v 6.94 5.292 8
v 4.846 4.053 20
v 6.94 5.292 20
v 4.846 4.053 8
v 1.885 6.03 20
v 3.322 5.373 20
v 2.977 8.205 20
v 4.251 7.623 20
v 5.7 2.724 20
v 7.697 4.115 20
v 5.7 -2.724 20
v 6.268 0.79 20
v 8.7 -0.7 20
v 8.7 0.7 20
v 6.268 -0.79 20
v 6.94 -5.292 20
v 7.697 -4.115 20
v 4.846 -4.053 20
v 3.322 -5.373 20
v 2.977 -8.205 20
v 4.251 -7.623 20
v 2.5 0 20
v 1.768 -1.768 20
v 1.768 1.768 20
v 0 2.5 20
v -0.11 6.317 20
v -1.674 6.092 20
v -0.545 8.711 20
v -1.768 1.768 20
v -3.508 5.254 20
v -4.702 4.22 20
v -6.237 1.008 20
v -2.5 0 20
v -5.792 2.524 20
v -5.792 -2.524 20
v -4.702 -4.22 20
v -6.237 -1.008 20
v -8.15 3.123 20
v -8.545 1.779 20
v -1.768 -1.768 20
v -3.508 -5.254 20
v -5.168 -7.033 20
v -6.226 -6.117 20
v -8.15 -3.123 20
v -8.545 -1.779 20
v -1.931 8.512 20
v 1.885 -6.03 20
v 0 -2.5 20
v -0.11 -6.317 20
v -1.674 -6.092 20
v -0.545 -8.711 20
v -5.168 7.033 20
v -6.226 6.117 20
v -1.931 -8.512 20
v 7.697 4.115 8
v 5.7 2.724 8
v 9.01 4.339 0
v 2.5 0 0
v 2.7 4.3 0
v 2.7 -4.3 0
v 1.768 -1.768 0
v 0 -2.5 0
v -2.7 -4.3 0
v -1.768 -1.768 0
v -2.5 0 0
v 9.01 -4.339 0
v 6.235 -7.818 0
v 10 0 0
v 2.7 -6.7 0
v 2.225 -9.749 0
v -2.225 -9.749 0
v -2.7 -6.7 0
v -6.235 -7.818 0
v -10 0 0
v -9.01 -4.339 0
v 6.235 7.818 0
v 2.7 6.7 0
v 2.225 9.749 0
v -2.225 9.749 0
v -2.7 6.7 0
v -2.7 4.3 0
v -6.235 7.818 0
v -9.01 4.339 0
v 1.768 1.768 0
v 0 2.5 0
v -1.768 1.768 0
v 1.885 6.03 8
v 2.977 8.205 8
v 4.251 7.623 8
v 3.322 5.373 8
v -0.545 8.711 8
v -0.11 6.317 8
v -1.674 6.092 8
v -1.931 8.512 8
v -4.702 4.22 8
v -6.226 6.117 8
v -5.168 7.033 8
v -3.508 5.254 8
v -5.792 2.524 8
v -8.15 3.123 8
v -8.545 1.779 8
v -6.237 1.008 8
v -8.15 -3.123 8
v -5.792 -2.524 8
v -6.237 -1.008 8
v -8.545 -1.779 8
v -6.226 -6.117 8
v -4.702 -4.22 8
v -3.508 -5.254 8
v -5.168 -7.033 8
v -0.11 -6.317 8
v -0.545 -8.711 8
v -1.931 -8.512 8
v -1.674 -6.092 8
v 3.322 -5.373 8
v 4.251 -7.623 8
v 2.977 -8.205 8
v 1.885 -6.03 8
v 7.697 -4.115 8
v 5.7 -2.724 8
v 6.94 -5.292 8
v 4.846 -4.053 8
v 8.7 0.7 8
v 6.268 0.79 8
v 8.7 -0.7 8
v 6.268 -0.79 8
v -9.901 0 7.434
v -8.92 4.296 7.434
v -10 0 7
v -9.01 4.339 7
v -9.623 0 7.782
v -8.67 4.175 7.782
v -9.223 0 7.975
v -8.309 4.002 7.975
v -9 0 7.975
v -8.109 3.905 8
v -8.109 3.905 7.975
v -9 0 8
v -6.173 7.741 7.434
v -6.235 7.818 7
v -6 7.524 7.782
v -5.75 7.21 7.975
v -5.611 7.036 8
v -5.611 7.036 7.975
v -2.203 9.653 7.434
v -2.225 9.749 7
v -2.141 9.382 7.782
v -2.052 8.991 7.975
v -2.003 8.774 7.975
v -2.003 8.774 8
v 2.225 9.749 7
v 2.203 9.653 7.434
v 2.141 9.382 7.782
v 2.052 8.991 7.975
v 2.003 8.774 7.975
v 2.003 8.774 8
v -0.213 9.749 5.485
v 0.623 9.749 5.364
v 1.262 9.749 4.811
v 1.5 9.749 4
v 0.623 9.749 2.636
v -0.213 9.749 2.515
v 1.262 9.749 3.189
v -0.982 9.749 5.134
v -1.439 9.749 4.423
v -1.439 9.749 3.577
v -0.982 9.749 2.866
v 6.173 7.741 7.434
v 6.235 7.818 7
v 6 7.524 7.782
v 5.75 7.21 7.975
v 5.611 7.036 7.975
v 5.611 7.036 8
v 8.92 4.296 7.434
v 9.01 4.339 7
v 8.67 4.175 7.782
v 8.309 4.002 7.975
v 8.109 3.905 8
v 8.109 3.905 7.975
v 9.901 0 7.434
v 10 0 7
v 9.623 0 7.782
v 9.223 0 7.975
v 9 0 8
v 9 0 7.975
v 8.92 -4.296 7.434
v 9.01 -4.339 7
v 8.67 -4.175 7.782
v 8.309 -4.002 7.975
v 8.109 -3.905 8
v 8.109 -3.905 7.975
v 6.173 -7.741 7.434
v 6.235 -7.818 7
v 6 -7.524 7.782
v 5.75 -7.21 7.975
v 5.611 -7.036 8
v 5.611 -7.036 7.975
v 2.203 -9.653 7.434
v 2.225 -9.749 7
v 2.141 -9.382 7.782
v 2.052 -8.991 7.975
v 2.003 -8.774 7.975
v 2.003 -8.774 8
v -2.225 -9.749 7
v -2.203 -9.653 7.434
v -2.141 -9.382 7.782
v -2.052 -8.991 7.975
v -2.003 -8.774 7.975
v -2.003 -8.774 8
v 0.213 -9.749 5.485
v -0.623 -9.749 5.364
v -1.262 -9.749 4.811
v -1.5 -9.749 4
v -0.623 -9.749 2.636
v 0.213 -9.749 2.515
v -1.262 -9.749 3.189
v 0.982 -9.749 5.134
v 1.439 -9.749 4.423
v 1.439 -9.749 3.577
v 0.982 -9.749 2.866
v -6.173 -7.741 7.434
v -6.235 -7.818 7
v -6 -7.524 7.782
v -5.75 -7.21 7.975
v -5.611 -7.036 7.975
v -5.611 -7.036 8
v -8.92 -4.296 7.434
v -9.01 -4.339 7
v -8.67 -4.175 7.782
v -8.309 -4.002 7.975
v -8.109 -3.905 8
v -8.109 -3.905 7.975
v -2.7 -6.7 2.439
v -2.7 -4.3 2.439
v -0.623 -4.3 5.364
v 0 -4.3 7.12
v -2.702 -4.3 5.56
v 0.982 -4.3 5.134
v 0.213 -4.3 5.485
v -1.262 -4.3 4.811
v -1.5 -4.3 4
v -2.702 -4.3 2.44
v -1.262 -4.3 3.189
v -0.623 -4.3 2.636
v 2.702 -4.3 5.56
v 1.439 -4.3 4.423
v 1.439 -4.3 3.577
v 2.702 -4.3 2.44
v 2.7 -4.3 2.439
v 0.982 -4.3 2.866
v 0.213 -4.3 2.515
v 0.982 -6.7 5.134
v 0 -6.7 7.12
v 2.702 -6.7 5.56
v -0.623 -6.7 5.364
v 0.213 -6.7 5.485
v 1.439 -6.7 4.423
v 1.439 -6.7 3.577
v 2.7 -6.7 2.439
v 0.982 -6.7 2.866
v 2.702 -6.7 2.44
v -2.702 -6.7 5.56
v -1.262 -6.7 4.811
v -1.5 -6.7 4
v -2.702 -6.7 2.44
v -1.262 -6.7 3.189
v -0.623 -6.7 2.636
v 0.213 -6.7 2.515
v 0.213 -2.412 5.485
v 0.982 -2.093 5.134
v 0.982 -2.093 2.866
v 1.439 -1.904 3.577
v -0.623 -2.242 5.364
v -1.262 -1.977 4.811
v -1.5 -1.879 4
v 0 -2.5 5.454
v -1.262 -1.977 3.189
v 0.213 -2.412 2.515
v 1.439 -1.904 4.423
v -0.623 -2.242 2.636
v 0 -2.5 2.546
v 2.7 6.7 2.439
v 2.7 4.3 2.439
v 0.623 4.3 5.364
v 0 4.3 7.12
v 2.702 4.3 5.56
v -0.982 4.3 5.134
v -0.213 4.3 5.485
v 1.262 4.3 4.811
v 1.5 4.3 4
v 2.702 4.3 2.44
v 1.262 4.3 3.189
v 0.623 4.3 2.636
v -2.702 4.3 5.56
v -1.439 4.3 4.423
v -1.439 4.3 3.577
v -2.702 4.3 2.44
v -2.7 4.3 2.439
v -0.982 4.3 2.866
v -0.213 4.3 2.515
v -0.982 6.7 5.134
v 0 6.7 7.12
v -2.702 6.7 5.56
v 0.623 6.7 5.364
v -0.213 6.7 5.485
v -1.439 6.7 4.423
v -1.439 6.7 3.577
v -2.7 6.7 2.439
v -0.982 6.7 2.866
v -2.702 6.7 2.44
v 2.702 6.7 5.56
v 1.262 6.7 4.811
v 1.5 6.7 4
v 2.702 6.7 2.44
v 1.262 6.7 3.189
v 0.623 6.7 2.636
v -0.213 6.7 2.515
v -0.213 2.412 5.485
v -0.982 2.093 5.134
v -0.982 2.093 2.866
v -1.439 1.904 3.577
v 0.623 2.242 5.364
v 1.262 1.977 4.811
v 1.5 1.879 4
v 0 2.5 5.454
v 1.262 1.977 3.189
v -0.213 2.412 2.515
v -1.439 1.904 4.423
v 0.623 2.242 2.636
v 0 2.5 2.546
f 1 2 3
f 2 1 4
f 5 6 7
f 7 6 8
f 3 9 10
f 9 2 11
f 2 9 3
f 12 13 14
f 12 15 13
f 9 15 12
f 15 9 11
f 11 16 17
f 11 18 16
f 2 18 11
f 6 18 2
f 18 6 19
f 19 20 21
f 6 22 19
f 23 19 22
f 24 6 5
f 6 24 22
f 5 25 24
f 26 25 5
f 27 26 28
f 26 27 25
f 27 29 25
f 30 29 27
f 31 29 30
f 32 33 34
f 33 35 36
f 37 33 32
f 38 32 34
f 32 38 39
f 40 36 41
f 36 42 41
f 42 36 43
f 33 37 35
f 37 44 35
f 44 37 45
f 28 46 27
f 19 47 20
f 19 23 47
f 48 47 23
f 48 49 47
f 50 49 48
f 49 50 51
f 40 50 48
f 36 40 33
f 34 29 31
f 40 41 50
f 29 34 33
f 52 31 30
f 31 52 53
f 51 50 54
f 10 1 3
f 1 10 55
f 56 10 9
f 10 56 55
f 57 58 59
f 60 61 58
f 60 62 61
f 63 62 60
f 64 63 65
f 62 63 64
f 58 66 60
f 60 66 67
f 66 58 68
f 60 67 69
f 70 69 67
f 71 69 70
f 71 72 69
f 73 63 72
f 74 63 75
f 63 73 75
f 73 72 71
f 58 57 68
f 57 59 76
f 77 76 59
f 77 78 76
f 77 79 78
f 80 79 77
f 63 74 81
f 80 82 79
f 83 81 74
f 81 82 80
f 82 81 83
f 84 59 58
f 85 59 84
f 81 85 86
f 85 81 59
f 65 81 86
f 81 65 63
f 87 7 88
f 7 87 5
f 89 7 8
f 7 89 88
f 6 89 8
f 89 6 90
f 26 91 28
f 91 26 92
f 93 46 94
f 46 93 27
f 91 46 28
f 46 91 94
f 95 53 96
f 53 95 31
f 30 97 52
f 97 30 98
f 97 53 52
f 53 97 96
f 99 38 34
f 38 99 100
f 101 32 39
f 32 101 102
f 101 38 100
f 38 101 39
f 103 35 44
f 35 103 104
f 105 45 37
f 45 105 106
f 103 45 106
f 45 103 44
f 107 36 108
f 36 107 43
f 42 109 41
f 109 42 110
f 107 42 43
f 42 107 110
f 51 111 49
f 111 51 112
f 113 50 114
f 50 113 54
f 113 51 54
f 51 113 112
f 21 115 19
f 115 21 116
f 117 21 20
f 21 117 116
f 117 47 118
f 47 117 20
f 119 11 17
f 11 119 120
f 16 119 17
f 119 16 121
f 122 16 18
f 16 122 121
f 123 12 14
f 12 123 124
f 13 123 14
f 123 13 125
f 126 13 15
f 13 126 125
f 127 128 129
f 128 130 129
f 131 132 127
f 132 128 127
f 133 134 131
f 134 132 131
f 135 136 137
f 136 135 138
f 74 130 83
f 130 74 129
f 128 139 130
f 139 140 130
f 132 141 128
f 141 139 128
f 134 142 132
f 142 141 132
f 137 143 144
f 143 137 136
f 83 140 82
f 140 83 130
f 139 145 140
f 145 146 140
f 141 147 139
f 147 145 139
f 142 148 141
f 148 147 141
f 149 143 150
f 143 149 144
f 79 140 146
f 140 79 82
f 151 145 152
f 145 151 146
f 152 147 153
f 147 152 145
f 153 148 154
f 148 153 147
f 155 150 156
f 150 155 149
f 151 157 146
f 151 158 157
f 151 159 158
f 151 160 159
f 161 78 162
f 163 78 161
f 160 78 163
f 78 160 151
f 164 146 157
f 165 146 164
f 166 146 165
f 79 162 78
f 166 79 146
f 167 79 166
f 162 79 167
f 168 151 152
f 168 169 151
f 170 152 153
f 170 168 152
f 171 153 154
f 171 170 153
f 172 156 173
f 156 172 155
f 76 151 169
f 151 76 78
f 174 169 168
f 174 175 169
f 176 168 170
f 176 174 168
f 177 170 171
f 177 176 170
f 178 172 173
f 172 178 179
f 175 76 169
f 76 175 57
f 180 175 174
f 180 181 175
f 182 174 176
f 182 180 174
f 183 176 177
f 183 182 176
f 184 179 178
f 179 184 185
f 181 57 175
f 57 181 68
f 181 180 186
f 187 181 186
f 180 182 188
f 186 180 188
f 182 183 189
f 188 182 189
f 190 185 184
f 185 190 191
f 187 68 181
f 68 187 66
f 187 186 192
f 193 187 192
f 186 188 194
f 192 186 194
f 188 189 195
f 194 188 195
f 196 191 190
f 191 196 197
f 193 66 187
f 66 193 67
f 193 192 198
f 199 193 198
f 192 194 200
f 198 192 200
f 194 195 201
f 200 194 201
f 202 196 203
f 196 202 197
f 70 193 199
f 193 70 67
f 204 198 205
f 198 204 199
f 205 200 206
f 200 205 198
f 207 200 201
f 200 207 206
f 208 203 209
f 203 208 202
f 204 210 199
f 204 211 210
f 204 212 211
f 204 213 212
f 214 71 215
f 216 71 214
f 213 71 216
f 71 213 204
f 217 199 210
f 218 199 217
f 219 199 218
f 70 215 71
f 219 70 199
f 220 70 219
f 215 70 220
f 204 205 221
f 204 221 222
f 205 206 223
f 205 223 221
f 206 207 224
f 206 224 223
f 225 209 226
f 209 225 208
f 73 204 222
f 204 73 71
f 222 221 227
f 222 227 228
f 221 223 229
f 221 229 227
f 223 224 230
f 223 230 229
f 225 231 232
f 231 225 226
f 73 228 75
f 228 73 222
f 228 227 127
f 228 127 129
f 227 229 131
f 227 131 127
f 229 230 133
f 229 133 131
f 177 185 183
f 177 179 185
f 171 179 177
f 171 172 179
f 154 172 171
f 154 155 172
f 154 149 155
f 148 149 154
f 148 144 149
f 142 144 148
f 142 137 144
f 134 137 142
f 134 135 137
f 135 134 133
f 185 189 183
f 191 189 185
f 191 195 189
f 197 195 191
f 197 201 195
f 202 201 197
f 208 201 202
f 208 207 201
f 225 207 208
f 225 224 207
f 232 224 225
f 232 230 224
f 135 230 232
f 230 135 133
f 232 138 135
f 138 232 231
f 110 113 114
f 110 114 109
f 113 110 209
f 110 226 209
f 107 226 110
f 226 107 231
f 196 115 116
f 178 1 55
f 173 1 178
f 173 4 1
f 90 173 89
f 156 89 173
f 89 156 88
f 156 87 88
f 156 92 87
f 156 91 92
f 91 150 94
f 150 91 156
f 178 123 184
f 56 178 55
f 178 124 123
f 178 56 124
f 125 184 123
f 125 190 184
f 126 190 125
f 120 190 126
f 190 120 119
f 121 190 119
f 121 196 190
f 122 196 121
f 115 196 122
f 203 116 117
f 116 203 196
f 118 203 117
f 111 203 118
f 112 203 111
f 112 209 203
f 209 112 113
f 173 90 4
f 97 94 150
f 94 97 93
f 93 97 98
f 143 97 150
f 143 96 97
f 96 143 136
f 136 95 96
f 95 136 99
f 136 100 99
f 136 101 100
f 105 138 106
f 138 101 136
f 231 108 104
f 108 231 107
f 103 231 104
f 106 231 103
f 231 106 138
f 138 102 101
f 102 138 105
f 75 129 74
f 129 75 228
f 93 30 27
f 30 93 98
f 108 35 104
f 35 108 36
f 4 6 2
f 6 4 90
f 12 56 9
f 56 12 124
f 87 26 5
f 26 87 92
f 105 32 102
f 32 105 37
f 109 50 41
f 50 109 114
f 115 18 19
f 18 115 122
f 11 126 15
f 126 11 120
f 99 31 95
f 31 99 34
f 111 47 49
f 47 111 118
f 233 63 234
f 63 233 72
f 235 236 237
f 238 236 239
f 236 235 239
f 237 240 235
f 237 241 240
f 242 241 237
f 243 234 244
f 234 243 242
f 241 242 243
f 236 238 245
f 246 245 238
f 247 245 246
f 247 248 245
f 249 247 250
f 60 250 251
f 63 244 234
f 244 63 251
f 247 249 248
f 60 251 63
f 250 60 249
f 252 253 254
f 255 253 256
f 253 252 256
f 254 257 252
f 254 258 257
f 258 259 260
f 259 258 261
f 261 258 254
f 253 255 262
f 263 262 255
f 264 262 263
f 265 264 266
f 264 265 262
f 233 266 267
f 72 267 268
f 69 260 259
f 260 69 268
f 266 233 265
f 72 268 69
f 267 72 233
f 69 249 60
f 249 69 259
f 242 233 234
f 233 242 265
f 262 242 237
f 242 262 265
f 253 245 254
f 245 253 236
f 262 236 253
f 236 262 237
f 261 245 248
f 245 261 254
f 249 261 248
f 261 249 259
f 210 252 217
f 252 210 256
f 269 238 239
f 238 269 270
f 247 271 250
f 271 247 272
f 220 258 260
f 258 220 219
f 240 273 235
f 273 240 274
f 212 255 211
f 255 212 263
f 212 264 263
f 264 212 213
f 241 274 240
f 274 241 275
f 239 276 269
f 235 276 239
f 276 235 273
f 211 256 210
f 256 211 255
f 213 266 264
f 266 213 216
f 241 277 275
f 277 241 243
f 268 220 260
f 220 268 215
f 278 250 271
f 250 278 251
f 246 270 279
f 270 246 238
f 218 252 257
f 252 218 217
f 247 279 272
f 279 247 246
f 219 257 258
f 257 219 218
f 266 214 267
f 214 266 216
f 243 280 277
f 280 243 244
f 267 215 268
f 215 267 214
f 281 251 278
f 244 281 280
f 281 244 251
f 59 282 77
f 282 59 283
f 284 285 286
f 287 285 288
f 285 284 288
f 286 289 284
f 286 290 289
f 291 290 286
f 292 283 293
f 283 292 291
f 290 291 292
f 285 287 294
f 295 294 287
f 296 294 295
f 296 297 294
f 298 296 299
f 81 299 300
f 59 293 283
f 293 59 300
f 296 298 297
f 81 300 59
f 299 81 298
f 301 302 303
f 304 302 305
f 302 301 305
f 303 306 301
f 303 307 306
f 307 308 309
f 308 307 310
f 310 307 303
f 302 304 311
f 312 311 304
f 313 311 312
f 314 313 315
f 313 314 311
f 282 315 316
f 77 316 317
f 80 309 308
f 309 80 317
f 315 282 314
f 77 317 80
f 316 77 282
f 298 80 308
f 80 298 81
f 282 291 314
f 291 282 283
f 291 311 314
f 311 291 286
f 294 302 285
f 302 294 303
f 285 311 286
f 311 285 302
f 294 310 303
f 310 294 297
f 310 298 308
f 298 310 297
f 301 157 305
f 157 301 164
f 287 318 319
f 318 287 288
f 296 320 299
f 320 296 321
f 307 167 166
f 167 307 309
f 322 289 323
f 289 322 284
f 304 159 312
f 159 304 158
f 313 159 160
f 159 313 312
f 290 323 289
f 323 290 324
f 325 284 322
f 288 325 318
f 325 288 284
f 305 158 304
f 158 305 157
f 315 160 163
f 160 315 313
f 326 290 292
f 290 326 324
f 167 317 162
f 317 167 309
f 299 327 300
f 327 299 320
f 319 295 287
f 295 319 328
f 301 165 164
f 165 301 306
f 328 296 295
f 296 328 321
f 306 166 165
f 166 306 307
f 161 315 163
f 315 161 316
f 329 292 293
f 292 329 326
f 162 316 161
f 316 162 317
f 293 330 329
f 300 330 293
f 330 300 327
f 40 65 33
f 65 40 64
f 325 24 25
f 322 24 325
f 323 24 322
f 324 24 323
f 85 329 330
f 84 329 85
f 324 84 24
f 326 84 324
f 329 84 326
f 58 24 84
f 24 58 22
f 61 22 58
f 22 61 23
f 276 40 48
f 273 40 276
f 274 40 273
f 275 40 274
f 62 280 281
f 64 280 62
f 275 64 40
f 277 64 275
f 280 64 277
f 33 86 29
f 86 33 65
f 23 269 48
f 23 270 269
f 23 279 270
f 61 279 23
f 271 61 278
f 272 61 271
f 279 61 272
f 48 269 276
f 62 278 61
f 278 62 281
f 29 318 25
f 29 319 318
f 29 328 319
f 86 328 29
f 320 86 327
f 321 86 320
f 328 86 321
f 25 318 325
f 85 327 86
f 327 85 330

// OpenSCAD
$fn=11;
module main()
{
	module spur()
	{
		linear_extrude(height=20) polygon([[-2,-0.8],[-2,0.8],[0.7,0.7],[0.7,-0.7]],[[0,1,2,3,0]]);
	}
	
 difference()
 {	 
 	union()
 	{
 		//base
 		rotate_extrude($fn=14)
 		{
 				square([9,8]);
 				square([10,7]);
 				translate([9,7]) circle(1);
 		}
    	
    	//shaft
    	cylinder(r=6.5,h=20);
    	
    	//spurs
    	for(i=[1:11]) rotate([0,0,i*(360/11)])
    	translate([8,0,0])spur();
   }
   
   //shaft hole
    translate([0,0,-1])cylinder(r=2.5,h=22,$fn=8);
    		
    //captive nut and grub holes
    for(j=[1:2]) rotate([0,0,j*(360/2)])
	translate([0,20,4])rotate([90,0,0])
	union()
	{
		//enterance
		translate([0,-3,14.5]) cube([5.4,6,2.4],center=true);
		//nut
		translate([0,0,13.3]) rotate([0,0,30])cylinder(r=3.12,h=2.4,$fn=6);
		//grub hole
		translate([0,0,9]) cylinder(r=1.5,h=10);
	}

 }

   
}

main();
